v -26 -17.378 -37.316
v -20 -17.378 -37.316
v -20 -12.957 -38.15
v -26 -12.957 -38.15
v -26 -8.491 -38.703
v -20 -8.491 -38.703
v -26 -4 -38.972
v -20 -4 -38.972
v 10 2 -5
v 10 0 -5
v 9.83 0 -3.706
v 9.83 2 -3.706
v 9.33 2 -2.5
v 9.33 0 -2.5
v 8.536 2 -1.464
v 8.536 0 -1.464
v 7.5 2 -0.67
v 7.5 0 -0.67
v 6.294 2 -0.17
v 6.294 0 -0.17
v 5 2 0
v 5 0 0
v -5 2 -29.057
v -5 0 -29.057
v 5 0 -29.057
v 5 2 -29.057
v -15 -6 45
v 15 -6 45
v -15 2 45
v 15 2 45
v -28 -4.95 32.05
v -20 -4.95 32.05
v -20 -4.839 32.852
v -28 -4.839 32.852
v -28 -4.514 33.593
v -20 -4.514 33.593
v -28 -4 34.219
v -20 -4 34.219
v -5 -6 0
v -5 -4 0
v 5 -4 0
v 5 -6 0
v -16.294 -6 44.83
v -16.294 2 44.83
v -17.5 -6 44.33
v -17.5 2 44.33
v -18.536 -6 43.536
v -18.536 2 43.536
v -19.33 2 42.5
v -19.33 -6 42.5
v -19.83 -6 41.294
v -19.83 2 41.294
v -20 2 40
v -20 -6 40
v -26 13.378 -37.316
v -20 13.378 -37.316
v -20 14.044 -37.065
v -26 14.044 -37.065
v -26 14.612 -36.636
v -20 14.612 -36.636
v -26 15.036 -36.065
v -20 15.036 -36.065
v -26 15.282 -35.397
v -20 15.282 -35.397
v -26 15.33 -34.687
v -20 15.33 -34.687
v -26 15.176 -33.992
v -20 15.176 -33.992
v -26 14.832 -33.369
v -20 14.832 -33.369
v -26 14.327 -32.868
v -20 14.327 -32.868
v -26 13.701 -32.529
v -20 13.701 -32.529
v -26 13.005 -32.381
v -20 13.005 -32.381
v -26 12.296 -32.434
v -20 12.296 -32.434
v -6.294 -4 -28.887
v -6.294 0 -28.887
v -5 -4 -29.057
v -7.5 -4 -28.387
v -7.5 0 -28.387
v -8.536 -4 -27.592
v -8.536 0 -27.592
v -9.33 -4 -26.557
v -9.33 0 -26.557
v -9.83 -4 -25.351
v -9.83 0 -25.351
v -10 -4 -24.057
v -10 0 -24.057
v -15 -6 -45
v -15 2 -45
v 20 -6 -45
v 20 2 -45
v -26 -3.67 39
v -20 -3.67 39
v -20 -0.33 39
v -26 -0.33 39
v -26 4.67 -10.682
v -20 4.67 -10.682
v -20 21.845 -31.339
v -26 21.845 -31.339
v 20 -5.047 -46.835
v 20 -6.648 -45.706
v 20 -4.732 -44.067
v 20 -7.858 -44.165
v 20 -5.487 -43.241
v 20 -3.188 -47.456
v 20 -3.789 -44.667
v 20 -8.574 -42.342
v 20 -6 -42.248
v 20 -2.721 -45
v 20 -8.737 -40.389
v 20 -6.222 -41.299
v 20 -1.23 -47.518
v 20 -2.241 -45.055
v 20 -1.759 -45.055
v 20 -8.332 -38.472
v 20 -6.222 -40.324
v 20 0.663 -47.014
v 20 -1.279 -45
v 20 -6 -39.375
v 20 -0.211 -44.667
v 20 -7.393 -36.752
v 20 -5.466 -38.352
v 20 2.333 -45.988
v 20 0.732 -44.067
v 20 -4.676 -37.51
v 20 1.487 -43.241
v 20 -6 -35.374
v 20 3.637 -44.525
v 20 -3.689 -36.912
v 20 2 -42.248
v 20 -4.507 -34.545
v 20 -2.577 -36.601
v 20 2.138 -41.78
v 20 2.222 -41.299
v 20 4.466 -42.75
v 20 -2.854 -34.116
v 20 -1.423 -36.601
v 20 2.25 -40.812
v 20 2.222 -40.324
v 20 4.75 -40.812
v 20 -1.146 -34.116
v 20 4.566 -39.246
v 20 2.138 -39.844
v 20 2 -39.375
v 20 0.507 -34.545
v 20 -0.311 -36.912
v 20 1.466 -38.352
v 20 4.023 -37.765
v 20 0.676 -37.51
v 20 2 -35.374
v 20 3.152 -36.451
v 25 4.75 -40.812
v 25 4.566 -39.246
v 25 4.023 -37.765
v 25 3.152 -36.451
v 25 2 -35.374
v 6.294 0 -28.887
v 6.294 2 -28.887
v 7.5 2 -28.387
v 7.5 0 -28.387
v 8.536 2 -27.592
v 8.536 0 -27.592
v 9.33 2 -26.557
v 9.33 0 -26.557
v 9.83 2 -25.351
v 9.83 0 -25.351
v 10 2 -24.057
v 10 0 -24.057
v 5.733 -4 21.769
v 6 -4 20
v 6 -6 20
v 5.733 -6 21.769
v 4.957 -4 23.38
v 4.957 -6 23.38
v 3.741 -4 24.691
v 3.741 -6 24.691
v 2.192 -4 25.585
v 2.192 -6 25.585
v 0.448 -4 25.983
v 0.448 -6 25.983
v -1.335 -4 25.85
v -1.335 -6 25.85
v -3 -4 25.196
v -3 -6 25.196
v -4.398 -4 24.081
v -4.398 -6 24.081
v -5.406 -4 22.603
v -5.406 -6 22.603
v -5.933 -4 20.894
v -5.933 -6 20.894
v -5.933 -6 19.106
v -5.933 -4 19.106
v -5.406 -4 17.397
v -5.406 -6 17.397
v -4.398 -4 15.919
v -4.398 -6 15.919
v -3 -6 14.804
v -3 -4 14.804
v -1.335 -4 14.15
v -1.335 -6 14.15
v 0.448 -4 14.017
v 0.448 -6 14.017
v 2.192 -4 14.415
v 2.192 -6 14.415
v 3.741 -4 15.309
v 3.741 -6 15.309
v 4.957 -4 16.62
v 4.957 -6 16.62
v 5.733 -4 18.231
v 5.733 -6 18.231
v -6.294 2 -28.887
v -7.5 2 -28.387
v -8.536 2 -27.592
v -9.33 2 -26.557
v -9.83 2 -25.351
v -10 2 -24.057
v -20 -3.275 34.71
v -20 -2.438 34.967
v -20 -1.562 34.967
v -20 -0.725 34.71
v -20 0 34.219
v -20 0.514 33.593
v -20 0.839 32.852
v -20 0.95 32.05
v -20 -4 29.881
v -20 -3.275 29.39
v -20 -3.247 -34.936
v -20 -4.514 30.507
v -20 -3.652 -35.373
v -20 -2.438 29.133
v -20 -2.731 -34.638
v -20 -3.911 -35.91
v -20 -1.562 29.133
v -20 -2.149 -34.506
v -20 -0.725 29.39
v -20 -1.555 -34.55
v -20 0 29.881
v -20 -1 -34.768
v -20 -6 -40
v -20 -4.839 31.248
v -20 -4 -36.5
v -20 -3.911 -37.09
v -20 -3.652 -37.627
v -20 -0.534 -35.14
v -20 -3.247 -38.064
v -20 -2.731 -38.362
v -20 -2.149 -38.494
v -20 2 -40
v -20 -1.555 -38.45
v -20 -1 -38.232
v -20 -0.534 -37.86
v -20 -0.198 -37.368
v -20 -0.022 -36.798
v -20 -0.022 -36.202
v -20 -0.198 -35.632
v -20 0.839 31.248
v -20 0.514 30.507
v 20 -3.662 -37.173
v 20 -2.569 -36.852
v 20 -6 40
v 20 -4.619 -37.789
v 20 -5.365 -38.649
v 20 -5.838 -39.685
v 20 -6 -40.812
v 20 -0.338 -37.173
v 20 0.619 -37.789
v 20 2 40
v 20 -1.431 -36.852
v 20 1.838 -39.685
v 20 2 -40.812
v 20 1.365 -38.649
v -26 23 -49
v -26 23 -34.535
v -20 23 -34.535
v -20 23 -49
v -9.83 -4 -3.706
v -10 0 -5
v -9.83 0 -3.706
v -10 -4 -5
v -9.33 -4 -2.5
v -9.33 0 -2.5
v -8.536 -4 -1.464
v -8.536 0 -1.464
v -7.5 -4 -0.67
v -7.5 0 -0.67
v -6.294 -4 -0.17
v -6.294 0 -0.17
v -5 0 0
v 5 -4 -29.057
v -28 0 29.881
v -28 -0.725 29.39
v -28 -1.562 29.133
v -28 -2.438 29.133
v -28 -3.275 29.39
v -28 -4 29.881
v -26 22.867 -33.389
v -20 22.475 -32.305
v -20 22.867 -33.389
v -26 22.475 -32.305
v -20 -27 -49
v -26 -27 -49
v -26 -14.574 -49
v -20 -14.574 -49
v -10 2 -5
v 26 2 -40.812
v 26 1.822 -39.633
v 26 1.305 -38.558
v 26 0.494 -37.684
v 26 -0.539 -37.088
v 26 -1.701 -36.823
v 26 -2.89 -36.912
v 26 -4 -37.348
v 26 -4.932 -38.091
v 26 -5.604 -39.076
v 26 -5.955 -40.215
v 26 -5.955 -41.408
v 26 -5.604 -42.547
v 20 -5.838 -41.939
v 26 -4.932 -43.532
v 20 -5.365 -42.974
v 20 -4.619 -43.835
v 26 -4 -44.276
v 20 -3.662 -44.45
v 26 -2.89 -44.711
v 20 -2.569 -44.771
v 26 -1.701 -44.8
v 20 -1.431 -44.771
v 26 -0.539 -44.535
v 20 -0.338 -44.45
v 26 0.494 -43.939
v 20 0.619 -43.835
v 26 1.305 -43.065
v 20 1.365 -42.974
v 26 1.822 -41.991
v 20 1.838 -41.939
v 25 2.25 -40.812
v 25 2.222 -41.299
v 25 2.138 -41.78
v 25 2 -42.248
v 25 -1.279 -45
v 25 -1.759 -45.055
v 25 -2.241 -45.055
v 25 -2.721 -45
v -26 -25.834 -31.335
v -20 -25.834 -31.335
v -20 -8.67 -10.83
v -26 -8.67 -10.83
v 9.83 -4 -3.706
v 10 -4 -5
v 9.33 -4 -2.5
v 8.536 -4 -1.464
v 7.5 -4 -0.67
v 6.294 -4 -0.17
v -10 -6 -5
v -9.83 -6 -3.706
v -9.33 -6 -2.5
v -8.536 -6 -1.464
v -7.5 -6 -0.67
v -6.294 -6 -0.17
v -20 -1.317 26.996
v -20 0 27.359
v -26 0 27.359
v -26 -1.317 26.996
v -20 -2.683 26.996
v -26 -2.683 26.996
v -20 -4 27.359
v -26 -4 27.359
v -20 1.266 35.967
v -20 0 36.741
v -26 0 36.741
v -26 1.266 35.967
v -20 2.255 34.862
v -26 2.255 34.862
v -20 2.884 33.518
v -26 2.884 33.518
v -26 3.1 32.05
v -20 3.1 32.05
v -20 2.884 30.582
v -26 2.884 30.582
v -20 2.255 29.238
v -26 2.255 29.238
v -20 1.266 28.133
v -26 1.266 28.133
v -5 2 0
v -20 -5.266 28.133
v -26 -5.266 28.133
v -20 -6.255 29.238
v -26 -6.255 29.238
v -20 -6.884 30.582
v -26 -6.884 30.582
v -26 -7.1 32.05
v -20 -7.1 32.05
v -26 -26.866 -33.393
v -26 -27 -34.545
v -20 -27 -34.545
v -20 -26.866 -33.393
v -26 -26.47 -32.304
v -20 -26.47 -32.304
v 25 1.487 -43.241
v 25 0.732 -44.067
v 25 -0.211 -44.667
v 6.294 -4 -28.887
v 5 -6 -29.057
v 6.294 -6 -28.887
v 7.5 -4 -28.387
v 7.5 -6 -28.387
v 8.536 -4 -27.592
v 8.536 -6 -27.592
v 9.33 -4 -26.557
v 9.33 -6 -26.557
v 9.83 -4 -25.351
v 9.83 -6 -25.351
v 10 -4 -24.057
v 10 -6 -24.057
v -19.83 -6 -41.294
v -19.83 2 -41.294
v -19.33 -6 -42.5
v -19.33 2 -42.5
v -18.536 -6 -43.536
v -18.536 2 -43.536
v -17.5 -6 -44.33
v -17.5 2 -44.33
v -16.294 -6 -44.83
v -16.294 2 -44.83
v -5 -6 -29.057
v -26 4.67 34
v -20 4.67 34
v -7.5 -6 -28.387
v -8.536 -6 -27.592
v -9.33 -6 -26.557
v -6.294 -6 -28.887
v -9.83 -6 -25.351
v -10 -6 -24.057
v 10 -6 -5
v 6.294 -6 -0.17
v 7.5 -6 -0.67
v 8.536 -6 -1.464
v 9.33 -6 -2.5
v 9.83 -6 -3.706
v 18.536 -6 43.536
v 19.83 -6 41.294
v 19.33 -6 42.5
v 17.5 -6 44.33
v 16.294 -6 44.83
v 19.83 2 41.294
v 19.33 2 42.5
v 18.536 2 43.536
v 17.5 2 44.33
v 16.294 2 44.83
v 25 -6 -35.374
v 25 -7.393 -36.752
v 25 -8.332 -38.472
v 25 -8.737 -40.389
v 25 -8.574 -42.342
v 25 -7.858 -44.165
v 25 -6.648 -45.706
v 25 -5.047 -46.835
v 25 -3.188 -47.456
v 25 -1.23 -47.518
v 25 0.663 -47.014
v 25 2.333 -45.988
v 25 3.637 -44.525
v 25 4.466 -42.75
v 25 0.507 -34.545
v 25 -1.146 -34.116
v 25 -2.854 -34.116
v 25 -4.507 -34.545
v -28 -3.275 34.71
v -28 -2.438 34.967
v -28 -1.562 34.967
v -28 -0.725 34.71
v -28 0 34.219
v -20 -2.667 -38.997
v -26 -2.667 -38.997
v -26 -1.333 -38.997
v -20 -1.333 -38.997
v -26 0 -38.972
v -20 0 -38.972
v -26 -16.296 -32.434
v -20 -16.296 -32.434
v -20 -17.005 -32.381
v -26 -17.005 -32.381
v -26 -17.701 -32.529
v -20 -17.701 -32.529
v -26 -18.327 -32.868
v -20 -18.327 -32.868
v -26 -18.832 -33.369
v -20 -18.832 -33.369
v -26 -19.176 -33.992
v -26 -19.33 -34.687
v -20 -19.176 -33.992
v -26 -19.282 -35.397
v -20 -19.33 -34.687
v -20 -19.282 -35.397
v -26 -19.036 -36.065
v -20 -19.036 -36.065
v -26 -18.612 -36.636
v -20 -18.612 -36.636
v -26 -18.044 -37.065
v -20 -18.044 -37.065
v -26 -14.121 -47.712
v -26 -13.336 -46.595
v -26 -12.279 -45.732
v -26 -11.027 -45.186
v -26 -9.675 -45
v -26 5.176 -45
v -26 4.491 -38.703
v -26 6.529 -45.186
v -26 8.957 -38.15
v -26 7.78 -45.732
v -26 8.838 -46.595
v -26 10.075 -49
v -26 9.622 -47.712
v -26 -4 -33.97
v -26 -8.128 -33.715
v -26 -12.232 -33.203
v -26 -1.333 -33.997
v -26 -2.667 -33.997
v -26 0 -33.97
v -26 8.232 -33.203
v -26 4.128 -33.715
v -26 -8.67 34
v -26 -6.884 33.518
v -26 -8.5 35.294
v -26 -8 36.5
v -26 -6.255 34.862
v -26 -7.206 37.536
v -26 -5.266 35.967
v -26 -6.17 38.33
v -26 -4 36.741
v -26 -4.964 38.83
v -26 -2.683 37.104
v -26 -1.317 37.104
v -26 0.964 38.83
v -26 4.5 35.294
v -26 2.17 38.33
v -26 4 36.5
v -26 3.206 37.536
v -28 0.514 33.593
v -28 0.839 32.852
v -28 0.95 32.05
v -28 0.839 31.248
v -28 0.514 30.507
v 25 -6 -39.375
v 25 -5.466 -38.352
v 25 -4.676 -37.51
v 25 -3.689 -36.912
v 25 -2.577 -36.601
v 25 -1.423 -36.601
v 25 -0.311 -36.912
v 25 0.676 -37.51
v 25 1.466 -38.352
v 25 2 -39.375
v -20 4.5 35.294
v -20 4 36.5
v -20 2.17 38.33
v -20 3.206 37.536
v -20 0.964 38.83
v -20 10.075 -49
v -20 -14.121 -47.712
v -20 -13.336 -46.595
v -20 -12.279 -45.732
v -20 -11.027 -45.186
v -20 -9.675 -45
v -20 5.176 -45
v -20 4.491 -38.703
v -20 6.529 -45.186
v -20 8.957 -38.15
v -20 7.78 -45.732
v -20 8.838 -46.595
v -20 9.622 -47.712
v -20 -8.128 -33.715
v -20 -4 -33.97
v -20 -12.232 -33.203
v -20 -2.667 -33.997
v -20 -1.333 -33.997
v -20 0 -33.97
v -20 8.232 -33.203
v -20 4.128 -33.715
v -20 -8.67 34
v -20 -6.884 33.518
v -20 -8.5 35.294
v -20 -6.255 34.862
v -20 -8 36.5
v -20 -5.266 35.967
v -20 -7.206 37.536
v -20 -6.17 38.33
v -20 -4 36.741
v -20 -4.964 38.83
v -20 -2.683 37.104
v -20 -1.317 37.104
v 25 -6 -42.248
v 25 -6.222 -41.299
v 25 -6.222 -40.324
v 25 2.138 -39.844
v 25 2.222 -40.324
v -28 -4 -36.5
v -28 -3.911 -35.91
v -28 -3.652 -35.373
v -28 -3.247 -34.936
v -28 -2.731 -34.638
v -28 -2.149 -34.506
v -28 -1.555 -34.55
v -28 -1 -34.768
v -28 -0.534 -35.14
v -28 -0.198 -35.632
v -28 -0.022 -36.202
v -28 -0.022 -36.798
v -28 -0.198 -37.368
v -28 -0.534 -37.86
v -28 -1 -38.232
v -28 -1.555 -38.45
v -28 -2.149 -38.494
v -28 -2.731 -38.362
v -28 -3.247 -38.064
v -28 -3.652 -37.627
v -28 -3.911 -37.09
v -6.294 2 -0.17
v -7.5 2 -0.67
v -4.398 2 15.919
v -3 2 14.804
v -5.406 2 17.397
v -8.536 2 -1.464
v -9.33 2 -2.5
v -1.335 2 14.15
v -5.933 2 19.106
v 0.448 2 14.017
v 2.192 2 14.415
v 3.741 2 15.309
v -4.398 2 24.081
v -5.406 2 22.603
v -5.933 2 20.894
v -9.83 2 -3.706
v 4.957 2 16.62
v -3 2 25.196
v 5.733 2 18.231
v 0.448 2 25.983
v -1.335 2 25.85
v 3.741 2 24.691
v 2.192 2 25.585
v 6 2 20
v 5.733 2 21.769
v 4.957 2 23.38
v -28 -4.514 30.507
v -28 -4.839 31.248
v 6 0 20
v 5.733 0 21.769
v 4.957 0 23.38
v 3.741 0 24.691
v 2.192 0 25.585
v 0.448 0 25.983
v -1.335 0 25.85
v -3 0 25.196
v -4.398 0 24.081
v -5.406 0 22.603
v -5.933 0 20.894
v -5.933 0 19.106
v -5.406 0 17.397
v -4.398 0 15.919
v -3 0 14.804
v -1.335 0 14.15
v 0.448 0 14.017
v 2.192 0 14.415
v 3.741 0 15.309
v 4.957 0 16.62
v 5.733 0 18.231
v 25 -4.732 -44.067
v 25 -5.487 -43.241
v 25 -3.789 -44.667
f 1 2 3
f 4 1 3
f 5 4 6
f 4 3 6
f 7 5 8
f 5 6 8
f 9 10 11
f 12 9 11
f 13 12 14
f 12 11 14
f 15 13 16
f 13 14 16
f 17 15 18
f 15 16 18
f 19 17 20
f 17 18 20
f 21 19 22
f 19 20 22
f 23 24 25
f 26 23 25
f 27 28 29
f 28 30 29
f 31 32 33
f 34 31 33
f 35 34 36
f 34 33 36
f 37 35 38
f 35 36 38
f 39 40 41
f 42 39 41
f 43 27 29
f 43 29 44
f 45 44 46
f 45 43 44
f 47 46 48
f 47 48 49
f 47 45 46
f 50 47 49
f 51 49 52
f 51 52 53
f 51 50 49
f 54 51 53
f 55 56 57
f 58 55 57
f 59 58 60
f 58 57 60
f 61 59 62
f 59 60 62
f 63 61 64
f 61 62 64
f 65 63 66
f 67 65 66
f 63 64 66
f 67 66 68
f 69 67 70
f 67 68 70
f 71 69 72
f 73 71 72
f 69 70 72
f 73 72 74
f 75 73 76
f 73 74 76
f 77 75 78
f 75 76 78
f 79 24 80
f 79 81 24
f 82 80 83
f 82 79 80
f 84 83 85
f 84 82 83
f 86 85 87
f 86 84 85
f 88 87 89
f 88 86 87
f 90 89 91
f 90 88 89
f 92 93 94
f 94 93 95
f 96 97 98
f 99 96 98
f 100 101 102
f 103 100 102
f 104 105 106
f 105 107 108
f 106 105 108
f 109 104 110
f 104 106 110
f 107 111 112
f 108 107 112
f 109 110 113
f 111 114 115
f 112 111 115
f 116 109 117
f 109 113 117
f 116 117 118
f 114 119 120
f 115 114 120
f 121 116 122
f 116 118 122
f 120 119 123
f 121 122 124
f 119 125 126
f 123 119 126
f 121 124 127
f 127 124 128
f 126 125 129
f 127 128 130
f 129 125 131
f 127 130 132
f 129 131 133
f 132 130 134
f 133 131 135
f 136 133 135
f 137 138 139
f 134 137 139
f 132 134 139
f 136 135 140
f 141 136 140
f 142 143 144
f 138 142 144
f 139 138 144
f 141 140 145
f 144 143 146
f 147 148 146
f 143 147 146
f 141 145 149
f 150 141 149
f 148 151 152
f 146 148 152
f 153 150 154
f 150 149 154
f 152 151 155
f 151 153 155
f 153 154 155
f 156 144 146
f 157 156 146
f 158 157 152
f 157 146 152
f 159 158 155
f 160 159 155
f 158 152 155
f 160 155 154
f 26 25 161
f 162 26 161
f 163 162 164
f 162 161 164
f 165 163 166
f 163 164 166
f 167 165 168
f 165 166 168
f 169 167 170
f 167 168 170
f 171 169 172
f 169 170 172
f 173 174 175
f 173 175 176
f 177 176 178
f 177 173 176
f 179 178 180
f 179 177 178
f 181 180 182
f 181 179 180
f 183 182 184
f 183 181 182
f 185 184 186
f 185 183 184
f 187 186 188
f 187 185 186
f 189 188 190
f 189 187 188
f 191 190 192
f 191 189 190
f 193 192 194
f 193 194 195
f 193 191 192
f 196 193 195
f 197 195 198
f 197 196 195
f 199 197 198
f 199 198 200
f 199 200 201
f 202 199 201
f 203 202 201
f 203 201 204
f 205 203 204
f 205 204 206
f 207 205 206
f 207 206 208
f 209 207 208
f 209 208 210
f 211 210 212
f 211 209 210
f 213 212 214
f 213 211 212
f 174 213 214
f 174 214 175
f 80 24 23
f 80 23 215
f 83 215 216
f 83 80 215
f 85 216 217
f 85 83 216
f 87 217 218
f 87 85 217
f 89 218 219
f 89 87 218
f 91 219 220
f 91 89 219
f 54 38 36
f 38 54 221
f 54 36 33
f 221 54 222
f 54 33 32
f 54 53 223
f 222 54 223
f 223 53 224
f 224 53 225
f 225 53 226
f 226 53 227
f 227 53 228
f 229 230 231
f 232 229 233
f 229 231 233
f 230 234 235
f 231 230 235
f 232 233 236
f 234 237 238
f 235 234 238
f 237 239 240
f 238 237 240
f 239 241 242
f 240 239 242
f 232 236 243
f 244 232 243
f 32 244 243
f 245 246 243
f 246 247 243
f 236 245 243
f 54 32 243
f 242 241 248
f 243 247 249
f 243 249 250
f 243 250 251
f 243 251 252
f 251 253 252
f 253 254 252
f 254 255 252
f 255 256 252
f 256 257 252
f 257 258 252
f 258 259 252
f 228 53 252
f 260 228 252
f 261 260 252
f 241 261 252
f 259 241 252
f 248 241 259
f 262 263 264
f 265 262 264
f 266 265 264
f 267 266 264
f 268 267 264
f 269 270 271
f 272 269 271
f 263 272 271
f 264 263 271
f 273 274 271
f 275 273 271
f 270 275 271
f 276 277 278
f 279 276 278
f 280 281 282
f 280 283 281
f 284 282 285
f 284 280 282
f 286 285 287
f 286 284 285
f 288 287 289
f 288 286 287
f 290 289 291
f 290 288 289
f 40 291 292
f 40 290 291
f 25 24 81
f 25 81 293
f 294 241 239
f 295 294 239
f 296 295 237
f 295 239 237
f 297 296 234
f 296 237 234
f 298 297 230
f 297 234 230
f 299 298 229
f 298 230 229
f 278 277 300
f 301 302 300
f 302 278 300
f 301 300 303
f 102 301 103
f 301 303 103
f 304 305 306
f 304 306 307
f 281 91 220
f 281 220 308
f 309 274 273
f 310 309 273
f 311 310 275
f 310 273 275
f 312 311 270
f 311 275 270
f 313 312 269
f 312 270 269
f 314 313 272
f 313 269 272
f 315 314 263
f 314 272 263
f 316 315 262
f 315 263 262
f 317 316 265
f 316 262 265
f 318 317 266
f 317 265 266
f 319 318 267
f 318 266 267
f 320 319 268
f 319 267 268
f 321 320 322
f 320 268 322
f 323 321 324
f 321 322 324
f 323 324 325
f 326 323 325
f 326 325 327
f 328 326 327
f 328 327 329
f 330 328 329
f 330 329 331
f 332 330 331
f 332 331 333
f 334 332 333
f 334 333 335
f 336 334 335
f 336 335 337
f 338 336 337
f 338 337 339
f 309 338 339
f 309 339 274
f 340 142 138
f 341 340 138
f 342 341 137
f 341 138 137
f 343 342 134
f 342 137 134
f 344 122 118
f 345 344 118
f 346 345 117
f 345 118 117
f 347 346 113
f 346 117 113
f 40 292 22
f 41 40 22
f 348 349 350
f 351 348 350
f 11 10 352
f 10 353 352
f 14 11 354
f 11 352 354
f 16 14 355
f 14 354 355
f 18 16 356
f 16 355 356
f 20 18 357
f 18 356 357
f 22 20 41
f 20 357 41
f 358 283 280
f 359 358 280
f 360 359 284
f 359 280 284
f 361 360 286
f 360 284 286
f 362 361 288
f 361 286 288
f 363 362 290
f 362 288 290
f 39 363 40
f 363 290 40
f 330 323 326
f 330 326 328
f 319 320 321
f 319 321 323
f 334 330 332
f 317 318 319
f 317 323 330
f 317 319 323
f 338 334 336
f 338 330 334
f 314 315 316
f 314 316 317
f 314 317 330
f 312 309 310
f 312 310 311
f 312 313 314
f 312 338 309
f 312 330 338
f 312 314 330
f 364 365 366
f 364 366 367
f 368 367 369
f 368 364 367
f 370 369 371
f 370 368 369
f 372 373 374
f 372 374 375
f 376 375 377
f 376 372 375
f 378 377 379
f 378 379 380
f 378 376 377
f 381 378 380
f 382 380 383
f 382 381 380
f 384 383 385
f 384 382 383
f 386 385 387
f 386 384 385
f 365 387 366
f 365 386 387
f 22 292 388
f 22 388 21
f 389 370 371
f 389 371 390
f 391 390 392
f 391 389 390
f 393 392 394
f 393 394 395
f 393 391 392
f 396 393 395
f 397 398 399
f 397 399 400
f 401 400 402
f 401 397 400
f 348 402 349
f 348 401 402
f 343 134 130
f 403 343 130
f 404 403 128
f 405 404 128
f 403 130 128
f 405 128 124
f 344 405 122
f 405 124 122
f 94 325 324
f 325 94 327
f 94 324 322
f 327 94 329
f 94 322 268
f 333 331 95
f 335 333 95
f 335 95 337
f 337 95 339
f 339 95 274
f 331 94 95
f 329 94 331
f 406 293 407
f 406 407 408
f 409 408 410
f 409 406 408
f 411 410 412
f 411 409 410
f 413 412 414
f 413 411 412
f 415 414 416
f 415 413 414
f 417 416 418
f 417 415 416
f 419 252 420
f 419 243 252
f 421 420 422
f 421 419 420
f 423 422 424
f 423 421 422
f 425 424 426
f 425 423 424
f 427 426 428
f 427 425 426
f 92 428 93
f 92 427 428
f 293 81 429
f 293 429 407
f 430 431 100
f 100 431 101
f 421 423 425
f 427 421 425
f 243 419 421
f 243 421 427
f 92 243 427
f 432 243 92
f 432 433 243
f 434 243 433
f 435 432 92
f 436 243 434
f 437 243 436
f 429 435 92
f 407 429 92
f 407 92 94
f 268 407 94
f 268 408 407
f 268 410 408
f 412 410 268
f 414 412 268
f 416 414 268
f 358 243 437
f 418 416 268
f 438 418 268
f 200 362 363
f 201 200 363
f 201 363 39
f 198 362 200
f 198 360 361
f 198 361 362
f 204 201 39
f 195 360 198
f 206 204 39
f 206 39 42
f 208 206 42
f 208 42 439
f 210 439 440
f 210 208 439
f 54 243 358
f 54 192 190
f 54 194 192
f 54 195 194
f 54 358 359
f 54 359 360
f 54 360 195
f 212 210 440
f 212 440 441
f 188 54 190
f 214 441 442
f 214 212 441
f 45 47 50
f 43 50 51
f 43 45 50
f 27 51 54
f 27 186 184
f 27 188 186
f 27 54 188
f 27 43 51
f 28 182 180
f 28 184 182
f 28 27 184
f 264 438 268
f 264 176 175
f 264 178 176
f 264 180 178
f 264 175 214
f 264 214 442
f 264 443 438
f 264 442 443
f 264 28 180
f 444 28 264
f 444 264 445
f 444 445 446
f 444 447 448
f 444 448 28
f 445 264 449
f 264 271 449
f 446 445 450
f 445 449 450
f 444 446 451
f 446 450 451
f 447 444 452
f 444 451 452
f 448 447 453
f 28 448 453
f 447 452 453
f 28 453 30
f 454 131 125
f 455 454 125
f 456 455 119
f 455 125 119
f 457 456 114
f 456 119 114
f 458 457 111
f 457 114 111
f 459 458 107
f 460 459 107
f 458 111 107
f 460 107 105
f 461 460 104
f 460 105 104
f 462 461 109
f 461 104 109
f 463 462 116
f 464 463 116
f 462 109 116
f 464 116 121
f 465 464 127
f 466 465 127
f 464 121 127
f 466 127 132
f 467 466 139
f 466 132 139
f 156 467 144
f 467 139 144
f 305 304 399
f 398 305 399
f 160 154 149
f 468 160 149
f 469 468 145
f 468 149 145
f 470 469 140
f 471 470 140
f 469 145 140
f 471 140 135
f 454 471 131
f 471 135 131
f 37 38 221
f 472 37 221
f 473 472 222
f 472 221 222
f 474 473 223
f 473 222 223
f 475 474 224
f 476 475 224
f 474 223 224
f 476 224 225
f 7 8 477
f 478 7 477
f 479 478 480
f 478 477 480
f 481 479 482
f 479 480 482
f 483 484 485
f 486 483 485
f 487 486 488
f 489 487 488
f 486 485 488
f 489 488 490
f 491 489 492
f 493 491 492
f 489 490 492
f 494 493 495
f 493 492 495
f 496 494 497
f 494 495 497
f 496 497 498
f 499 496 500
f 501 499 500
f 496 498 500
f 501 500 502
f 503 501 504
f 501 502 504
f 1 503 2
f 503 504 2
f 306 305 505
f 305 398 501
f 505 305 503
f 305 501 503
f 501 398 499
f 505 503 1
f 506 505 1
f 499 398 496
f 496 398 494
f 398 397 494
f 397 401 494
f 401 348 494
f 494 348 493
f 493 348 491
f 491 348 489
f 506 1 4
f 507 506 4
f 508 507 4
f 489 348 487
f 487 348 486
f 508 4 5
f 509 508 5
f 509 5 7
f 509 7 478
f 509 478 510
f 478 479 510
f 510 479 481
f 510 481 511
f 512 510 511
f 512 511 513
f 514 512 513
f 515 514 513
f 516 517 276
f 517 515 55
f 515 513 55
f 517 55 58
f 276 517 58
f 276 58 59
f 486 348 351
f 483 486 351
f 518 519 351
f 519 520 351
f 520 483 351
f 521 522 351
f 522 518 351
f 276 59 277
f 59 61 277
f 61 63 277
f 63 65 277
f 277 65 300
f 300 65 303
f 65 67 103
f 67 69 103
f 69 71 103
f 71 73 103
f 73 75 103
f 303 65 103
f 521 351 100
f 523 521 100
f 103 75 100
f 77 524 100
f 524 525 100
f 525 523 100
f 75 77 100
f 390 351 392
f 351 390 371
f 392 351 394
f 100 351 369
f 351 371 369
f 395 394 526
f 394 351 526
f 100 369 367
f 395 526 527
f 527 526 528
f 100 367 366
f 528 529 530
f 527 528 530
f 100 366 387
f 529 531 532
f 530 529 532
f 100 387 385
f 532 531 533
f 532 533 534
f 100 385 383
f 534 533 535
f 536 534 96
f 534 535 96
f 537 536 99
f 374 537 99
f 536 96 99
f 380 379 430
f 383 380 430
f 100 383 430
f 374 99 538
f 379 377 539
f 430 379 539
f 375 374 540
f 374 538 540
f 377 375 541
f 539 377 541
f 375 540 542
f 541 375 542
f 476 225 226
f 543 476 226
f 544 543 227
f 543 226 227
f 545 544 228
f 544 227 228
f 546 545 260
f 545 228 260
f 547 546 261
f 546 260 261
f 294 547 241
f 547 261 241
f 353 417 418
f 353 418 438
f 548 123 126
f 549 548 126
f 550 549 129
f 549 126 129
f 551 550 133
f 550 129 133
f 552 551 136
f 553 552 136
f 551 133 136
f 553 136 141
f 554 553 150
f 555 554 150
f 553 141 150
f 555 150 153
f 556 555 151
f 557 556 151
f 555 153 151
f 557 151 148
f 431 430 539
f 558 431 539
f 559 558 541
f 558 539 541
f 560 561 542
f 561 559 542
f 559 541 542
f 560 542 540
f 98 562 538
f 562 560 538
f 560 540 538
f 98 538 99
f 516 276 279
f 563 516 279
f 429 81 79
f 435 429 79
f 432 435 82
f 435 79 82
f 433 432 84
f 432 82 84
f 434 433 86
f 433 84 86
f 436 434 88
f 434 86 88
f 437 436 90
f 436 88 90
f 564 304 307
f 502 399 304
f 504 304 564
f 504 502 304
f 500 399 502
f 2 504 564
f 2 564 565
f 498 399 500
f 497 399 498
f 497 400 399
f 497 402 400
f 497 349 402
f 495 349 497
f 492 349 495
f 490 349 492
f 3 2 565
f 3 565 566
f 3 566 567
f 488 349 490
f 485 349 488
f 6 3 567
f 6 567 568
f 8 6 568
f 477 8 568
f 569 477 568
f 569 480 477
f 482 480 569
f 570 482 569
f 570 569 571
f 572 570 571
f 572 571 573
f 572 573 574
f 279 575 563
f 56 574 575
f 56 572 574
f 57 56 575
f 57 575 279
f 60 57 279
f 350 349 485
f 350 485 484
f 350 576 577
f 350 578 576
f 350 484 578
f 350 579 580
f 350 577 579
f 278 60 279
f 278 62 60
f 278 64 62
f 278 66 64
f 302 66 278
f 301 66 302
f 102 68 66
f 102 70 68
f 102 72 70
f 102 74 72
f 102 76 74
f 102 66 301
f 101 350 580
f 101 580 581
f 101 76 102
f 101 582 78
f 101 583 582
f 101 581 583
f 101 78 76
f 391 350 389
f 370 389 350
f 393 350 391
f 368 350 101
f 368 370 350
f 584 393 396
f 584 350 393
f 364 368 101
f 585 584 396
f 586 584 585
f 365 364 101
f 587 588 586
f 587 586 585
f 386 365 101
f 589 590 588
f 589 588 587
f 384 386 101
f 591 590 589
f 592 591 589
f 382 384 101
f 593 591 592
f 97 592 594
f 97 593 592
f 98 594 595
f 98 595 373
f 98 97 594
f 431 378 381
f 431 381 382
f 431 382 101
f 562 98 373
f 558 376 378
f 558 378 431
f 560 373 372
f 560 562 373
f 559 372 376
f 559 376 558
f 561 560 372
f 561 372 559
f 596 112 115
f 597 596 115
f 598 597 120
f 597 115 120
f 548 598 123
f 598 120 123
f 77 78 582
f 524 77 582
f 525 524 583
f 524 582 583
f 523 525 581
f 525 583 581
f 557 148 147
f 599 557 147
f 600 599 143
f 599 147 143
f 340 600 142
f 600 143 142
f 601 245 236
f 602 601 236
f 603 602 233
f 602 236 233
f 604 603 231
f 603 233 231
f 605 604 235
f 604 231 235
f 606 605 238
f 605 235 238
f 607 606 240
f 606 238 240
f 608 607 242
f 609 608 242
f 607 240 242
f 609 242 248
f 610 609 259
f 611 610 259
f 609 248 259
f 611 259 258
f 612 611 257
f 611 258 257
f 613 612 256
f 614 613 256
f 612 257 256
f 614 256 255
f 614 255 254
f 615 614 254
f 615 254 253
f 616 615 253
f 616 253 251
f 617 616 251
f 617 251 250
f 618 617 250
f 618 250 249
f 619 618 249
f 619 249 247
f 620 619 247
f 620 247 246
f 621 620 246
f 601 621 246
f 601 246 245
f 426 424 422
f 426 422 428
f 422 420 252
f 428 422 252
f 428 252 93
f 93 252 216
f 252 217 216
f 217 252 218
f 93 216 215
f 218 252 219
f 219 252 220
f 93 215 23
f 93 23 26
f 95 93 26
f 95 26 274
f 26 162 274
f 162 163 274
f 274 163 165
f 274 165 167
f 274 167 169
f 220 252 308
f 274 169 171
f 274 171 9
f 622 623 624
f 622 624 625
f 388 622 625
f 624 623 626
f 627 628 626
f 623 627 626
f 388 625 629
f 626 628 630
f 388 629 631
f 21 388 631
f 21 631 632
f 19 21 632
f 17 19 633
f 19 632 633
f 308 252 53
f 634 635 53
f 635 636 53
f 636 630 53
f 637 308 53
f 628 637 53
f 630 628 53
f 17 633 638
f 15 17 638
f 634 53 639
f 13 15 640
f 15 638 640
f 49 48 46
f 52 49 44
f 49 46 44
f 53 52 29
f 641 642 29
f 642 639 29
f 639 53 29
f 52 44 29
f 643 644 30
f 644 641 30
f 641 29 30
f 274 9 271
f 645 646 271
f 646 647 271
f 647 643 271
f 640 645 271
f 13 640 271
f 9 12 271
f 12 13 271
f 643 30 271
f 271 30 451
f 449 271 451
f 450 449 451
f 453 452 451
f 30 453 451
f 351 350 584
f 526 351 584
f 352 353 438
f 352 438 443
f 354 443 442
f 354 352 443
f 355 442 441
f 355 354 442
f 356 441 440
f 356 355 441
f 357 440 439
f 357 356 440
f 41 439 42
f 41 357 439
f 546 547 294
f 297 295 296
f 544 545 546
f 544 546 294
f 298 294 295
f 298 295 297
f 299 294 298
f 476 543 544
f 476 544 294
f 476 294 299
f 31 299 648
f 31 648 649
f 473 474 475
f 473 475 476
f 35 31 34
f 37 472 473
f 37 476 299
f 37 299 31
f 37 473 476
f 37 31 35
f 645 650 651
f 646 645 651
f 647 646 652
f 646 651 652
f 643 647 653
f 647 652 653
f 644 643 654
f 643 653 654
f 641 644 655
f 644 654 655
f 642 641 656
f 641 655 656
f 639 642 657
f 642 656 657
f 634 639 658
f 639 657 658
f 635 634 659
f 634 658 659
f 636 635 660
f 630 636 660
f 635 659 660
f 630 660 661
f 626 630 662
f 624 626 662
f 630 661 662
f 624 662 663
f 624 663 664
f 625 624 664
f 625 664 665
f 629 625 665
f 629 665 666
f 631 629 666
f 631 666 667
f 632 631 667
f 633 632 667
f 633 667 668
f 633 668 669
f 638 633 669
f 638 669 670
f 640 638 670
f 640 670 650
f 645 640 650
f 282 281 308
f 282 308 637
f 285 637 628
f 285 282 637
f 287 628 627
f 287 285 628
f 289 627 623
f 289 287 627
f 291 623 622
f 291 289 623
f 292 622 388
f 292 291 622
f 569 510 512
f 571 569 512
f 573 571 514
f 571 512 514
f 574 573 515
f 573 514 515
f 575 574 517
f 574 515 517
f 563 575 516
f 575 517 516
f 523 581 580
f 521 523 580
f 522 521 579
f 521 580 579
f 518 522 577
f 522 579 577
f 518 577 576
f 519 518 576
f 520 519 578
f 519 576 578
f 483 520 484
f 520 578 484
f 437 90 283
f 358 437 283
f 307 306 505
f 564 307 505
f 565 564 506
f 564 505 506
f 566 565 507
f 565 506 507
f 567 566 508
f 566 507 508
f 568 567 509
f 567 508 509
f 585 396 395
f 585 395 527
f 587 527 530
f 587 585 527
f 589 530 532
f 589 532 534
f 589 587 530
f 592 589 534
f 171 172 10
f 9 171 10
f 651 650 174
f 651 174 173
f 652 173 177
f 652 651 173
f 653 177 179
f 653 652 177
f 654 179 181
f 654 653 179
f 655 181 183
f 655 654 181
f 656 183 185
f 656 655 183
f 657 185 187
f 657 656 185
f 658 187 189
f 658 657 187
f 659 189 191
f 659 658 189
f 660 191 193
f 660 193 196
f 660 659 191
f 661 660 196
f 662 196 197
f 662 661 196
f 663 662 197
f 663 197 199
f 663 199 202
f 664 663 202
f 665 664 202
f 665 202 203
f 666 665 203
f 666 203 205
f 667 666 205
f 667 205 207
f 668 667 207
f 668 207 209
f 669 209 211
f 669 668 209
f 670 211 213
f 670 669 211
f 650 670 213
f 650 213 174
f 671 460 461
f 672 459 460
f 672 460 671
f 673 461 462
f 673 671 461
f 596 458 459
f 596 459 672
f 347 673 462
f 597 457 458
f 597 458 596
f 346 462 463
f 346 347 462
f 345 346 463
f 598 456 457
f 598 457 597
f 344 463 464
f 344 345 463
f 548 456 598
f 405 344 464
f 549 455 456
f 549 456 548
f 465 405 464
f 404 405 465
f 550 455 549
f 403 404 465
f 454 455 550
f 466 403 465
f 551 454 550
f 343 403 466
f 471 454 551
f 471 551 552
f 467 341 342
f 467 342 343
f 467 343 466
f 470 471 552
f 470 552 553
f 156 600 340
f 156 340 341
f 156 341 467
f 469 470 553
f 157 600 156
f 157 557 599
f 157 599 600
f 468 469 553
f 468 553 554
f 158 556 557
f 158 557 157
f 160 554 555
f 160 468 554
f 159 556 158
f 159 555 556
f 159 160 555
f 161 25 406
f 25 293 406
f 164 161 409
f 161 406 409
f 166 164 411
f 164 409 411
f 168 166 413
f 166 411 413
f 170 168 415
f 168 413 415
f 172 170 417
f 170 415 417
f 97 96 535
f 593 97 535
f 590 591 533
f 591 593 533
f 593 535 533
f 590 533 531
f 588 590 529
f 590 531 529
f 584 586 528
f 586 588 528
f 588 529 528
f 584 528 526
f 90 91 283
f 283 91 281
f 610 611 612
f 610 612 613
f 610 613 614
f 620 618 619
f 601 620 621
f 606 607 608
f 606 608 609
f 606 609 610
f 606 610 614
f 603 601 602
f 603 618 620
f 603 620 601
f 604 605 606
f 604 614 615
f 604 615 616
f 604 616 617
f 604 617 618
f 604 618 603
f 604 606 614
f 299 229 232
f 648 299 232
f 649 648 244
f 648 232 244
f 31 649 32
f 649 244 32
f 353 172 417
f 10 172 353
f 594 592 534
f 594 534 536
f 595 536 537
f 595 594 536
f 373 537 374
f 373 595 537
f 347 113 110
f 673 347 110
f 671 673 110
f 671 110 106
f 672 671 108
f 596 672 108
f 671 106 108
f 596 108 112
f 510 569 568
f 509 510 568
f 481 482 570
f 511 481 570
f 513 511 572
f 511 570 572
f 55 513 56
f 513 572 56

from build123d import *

# Parameters (mm, degrees)
F0_W           = 20
F0_H           = 29.0569514036
F0_R           = 6
F1_DEPTH       = 4
F3_DEPTH       = 8
F4_DEPTH       = 6
F5_DEPTH       = 8
F6_W           = 6
F6_H           = 12.9247409806
F6_H_2         = 12.42620707
F7_DEPTH       = 4
F8_R           = 5
F9_DEPTH       = 6
F10_T1_DEPTH   = 6
F10_T3_DEPTH   = 6
F10_T5_DEPTH   = 15.0823576644
F10_T7_DEPTH   = 31
F10_T9_DEPTH   = 30.9999999981
F10_T11_DEPTH  = 15.0353408704
F11_DEPTH      = 2
F11_DEPTH_BACK = 6
F13_DEPTH      = 6
F14_DEPTH      = 5


# Not quite as in the source:
# - a fillet or chamfer that OpenCascade refuses, or shapes differently, is made with other operations: its cross-section is extruded or revolved along the edge and cut away or added


with BuildPart() as f1:
    # F0 (on Front) → F1 (new body)
    with BuildSketch(Plane.XZ):
        Polygon((20, -45), (20, 45), (-20, 45), (-20, -45), (-10, -45), (10, -45), align=None)
        with Locations((0, -14.5284757018)):
            Rectangle(F0_W, F0_H, mode=Mode.SUBTRACT)
        with Locations((0, 20)):
            Circle(F0_R, mode=Mode.SUBTRACT)
    extrude(amount=F1_DEPTH)

    # F2 (on face) → F3 (join)
    with BuildSketch(Plane(origin=(-20, 0, 0), x_dir=(0, -1, 0), z_dir=(-1, 0, 0))):
        with BuildLine():
            Line((4, 29.8814751558), (4, 34.2185248442))
            ThreePointArc((4, 34.2185248442), (2, 35), (0, 34.2185248442))
            Line((0, 34.2185248442), (0, 29.8814751558))
            ThreePointArc((0, 29.8814751558), (2, 29.1), (4, 29.8814751558))
        make_face()
        with BuildLine():
            ThreePointArc((4.95, 32.05), (4.7020825302, 33.2337440602), (4, 34.2185248442))
            Line((4, 34.2185248442), (4, 29.8814751558))
            ThreePointArc((4, 29.8814751558), (4.7020825302, 30.8662559398), (4.95, 32.05))
        make_face()
        with BuildLine():
            Line((0, 29.8814751558), (0, 34.2185248442))
            ThreePointArc((0, 34.2185248442), (-0.95, 32.05), (0, 29.8814751558))
        make_face()
    extrude(amount=F3_DEPTH)

    # F2 (on face) → F5 (join)
    with BuildSketch(Plane(origin=(-20, 0, 0), x_dir=(0, -1, 0), z_dir=(-1, 0, 0))):
        with BuildLine():
            ThreePointArc((0, -36.5), (1.9999999971, -38.4999999971), (3.9999999942, -36.5))
            ThreePointArc((3.9999999942, -36.5), (1.9999999971, -34.5000000029), (0, -36.5))
        make_face()
    extrude(amount=F5_DEPTH)

    # F8
    f8_edges = [f1.edges().sort_by_distance(p)[0] for p in [
        (-20, -2, -45),
        (-10, -2, 0),
        (-10, -2, -29.056951),
        (10, -2, 0),
        (20, -2, 45),
        (-20, -2, 45),
        (10, -2, -29.056951),
    ]]
    fillet(f8_edges, radius=F8_R)

    # F11 (add, two sides): a face of the model
    f11_faces = [f1.faces().sort_by_distance(p)[0] for p in [
        (0.0348005991, -4, 1.935297002),
    ]]
    extrude(f11_faces, amount=F11_DEPTH)
    extrude(f11_faces, amount=-F11_DEPTH_BACK)

    # F12 (on face) → F13 (join)
    with BuildSketch(Plane.YZ.offset(20)):
        with BuildLine():
            ThreePointArc((-6, -40.8116131475), (-2.0000000273, -44.8116132021), (2, -40.8116132021))
            ThreePointArc((2, -40.8116132021), (-1.9999999727, -36.8116132021), (-6, -40.8116131475))
        make_face()
    extrude(amount=F13_DEPTH)


with BuildPart() as f4:
    # F2 (on face) → F4 (new body)
    with BuildSketch(Plane(origin=(-20, 0, 0), x_dir=(0, -1, 0), z_dir=(-1, 0, 0))):
        with BuildLine():
            ThreePointArc((4, 27.3585183577), (6.2549970623, 29.2384168161), (7.1, 32.05))
            ThreePointArc((7.1, 32.05), (6.2549970623, 34.8615831839), (4, 36.7414816423))
            Line((4, 36.7414816423), (4, 34.2185248442))
            ThreePointArc((4, 34.2185248442), (4.7020825302, 33.2337440602), (4.95, 32.05))
            ThreePointArc((4.95, 32.05), (4.7020825302, 30.8662559398), (4, 29.8814751558))
            Line((4, 29.8814751558), (4, 27.3585183577))
        make_face()
        with BuildLine():
            ThreePointArc((4, 36.7414816423), (6.2549970623, 34.8615831839), (7.1, 32.05))
            ThreePointArc((7.1, 32.05), (6.2549970623, 29.2384168161), (4, 27.3585183577))
            Line((4, 27.3585183577), (4, -33.9697129651))
            ThreePointArc((4, -33.9697129651), (10.1840030349, -33.4910145964), (16.2958364979, -32.4343512709))
            ThreePointArc((16.2958364979, -32.4343512709), (19.2776755505, -34.333992254), (17.3780345674, -37.3158313065))
            ThreePointArc((17.3780345674, -37.3158313065), (10.7283799691, -38.4618279661), (4, -38.9718452309))
            Line((4, -38.9718452309), (4, -45))
            Line((4, -45), (26.999999997, -45))
            Line((26.999999997, -45), (26.999999997, -32.7280576398))
            Line((26.999999997, -32.7280576398), (8.6701322833, -10.8303275913))
            Line((8.6701322833, -10.8303275913), (8.6701322833, 39))
            Line((8.6701322833, 39), (4, 39))
            Line((4, 39), (4, 36.7414816423))
        make_face()
        with BuildLine():
            Line((4, 34.2185248442), (4, 36.7414816423))
            ThreePointArc((4, 36.7414816423), (2, 37.15), (0, 36.7414816423))
            Line((0, 36.7414816423), (0, 34.2185248442))
            ThreePointArc((0, 34.2185248442), (2, 35), (4, 34.2185248442))
        make_face()
        with BuildLine():
            ThreePointArc((0, 36.7414816423), (2, 37.15), (4, 36.7414816423))
            Line((4, 36.7414816423), (4, 39))
            Line((4, 39), (0, 39))
            Line((0, 39), (0, 36.7414816423))
        make_face()
        with BuildLine():
            Line((4, -33.9697129651), (4, 27.3585183577))
            ThreePointArc((4, 27.3585183577), (2, 26.95), (0, 27.3585183577))
            Line((0, 27.3585183577), (0, -33.9697129651))
            ThreePointArc((0, -33.9697129651), (2, -34), (4, -33.9697129651))
        make_face()
        with BuildLine():
            ThreePointArc((0, 27.3585183577), (2, 26.95), (4, 27.3585183577))
            Line((4, 27.3585183577), (4, 29.8814751558))
            ThreePointArc((4, 29.8814751558), (2, 29.1), (0, 29.8814751558))
            Line((0, 29.8814751558), (0, 27.3585183577))
        make_face()
        with BuildLine():
            Line((0, 34.2185248442), (0, 36.7414816423))
            ThreePointArc((0, 36.7414816423), (-3.1, 32.05), (0, 27.3585183577))
            Line((0, 27.3585183577), (0, 29.8814751558))
            ThreePointArc((0, 29.8814751558), (-0.95, 32.05), (0, 34.2185248442))
        make_face()
        with BuildLine():
            ThreePointArc((0, 27.3585183577), (-3.1, 32.05), (0, 36.7414816423))
            Line((0, 36.7414816423), (0, 39))
            Line((0, 39), (-4.6701322773, 39))
            Line((-4.6701322773, 39), (-4.6701322811, -10.6818171995))
            Line((-4.6701322811, -10.6818171995), (-23.000000003, -32.7280576398))
            Line((-23.000000003, -32.7280576398), (-23.000000003, -45))
            Line((-23.000000003, -45), (0, -45))
            Line((0, -45), (0, -38.9718452309))
            ThreePointArc((0, -38.9718452309), (-6.7283799721, -38.4618279657), (-13.3780345732, -37.3158313052))
            ThreePointArc((-13.3780345732, -37.3158313052), (-15.2776755561, -34.3339922525), (-12.2958365033, -32.4343512697))
            ThreePointArc((-12.2958365033, -32.4343512697), (-6.1840030376, -33.4910145961), (0, -33.9697129651))
            Line((0, -33.9697129651), (0, 27.3585183577))
        make_face()
        with BuildLine():
            Line((4, -45), (4, -38.9718452309))
            ThreePointArc((4, -38.9718452309), (2, -39), (0, -38.9718452309))
            Line((0, -38.9718452309), (0, -45))
            Line((0, -45), (4, -45))
        make_face()
    extrude(amount=F4_DEPTH)

    # F6 (on face) → F7 (join)
    with BuildSketch(Plane(origin=(0, 0, -45), x_dir=(1, 0, 0), z_dir=(0, 0, -1))):
        with Locations((-23, -16.5376295127)):
            Rectangle(F6_W, F6_H)
        with Locations((-23, 20.786896462)):
            Rectangle(F6_W, F6_H_2)
    extrude(amount=F7_DEPTH)

    # F2 (on face) → F9 (cut, through all)
    with BuildSketch(Plane(origin=(-20, 0, 0), x_dir=(0, -1, 0), z_dir=(-1, 0, 0))):
        with BuildLine():
            Line((4, 34.2185248442), (4, 36.7414816423))
            ThreePointArc((4, 36.7414816423), (2, 37.15), (0, 36.7414816423))
            Line((0, 36.7414816423), (0, 34.2185248442))
            ThreePointArc((0, 34.2185248442), (2, 35), (4, 34.2185248442))
        make_face()
        with BuildLine():
            Line((0, 34.2185248442), (0, 36.7414816423))
            ThreePointArc((0, 36.7414816423), (-3.1, 32.05), (0, 27.3585183577))
            Line((0, 27.3585183577), (0, 29.8814751558))
            ThreePointArc((0, 29.8814751558), (-0.95, 32.05), (0, 34.2185248442))
        make_face()
        with BuildLine():
            ThreePointArc((0, 27.3585183577), (2, 26.95), (4, 27.3585183577))
            Line((4, 27.3585183577), (4, 29.8814751558))
            ThreePointArc((4, 29.8814751558), (2, 29.1), (0, 29.8814751558))
            Line((0, 29.8814751558), (0, 27.3585183577))
        make_face()
        with BuildLine():
            ThreePointArc((4, 27.3585183577), (6.2549970623, 29.2384168161), (7.1, 32.05))
            ThreePointArc((7.1, 32.05), (6.2549970623, 34.8615831839), (4, 36.7414816423))
            Line((4, 36.7414816423), (4, 34.2185248442))
            ThreePointArc((4, 34.2185248442), (4.7020825302, 33.2337440602), (4.95, 32.05))
            ThreePointArc((4.95, 32.05), (4.7020825302, 30.8662559398), (4, 29.8814751558))
            Line((4, 29.8814751558), (4, 27.3585183577))
        make_face()
    extrude(amount=F9_DEPTH, mode=Mode.SUBTRACT)

    # F10: fillet of radius 5 on 6 edges, made by hand

    # F10_s2 → F10_t1 (join)
    with BuildSketch(Plane.YZ.offset(-26)):
        with BuildLine():
            ThreePointArc((-14.573792927, -49), (-12.8370911016, -46.1270166538), (-9.6748134414, -45))
            Line((-9.6748134414, -45), (-14.573792927, -45))
            Line((-14.573792927, -45), (-14.573792927, -49))
        make_face()
    extrude(amount=F10_T1_DEPTH)

    # F10_s4 → F10_t3 (join)
    with BuildSketch(Plane.YZ.offset(-26)):
        with BuildLine():
            ThreePointArc((5.1762795368, -45), (8.338557197, -46.1270166538), (10.0752590224, -49))
            Line((10.0752590224, -49), (10.0752590224, -45))
            Line((10.0752590224, -45), (5.1762795368, -45))
        make_face()
    extrude(amount=F10_T3_DEPTH)

    # F10_s6 → F10_t5 (cut)
    with BuildSketch(Plane.YZ.offset(-30.5411788322)):
        with BuildLine():
            ThreePointArc((-26.999999997, -34.5445291727), (-26.6994831746, -32.8372336905), (-25.8340568515, -31.3351666135))
            Line((-25.8340568515, -31.3351666135), (-26.999999997, -32.7280576398))
            Line((-26.999999997, -32.7280576398), (-26.999999997, -34.5445291727))
        make_face()
    extrude(amount=F10_T5_DEPTH, mode=Mode.SUBTRACT)

    # F10_s8 → F10_t7 (cut)
    with BuildSketch(Plane.YZ.offset(-38.5)):
        with BuildLine():
            ThreePointArc((-3.6701322833, 39), (-7.2056661892, 37.5355339059), (-8.6701322833, 34))
            Line((-8.6701322833, 34), (-8.6701322833, 39))
            Line((-8.6701322833, 39), (-3.6701322833, 39))
        make_face()
    extrude(amount=F10_T7_DEPTH, mode=Mode.SUBTRACT)

    # F10_s10 → F10_t9 (cut)
    with BuildSketch(Plane.YZ.offset(-38.499999999)):
        with BuildLine():
            ThreePointArc((4.6701322777, 34.0000000004), (3.2056661835, 37.5355339061), (-0.3298677223, 39))
            Line((-0.3298677223, 39), (4.6701322773, 39))
            Line((4.6701322773, 39), (4.6701322777, 34.0000000004))
        make_face()
    extrude(amount=F10_T9_DEPTH, mode=Mode.SUBTRACT)

    # F10_s12 → F10_t11 (cut)
    with BuildSketch(Plane.YZ.offset(-30.5176704352)):
        with BuildLine():
            ThreePointArc((23.000000003, -34.5351258139), (22.7023148902, -32.8356450985), (21.8447061222, -31.3385284265))
            Line((21.8447061222, -31.3385284265), (23.000000003, -32.7280576398))
            Line((23.000000003, -32.7280576398), (23.000000003, -34.5351258139))
        make_face()
    extrude(amount=F10_T11_DEPTH, mode=Mode.SUBTRACT)


with BuildPart() as f14:
    # F12 (on face) → F14 (new body)
    with BuildSketch(Plane.YZ.offset(20)):
        with BuildLine():
            Line((2, -45), (2, -42.2477538637))
            ThreePointArc((2, -42.2477538637), (0.7323612075, -44.0668708312), (-1.2789479692, -45))
            Line((-1.2789479692, -45), (0, -45))
            Line((0, -45), (2, -45))
        make_face()
        with BuildLine():
            ThreePointArc((2.25, -40.8116132021), (2.1870335561, -41.540482189), (2, -42.2477538637))
            Line((2, -42.2477538637), (2, -45))
            Line((2, -45), (0, -45))
            Line((0, -45), (-1.2789479692, -45))
            ThreePointArc((-1.2789479692, -45), (-2, -45.0616132021), (-2.7210520308, -45))
            Line((-2.7210520308, -45), (-4, -45))
            Line((-4, -45), (-6, -45))
            Line((-6, -45), (-6, -42.2477538637))
            ThreePointArc((-6, -42.2477538637), (-6.25, -40.8116132021), (-6, -39.3754725405))
            Line((-6, -39.3754725405), (-6, -35.3744724094))
            ThreePointArc((-6, -35.3744724094), (-5.0465144017, -46.8350051037), (4.75, -40.8116132021))
            ThreePointArc((4.75, -40.8116132021), (4.0233919016, -37.7650988004), (2, -35.3744724094))
            Line((2, -35.3744724094), (2, -39.3754725405))
            ThreePointArc((2, -39.3754725405), (2.1870335561, -40.0827442152), (2.25, -40.8116132021))
        make_face()
        with BuildLine():
            ThreePointArc((-6, -39.3754725405), (-2, -36.5616132021), (2, -39.3754725405))
            Line((2, -39.3754725405), (2, -35.3744724094))
            ThreePointArc((2, -35.3744724094), (-2, -34.0616132021), (-6, -35.3744724094))
            Line((-6, -35.3744724094), (-6, -39.3754725405))
        make_face()
        with BuildLine():
            ThreePointArc((-2.7210520308, -45), (-4.7323612075, -44.0668708312), (-6, -42.2477538637))
            Line((-6, -42.2477538637), (-6, -45))
            Line((-6, -45), (-4, -45))
            Line((-4, -45), (-2.7210520308, -45))
        make_face()
    extrude(amount=F14_DEPTH)


solid = Compound([f1.part, f4.part, f14.part])
